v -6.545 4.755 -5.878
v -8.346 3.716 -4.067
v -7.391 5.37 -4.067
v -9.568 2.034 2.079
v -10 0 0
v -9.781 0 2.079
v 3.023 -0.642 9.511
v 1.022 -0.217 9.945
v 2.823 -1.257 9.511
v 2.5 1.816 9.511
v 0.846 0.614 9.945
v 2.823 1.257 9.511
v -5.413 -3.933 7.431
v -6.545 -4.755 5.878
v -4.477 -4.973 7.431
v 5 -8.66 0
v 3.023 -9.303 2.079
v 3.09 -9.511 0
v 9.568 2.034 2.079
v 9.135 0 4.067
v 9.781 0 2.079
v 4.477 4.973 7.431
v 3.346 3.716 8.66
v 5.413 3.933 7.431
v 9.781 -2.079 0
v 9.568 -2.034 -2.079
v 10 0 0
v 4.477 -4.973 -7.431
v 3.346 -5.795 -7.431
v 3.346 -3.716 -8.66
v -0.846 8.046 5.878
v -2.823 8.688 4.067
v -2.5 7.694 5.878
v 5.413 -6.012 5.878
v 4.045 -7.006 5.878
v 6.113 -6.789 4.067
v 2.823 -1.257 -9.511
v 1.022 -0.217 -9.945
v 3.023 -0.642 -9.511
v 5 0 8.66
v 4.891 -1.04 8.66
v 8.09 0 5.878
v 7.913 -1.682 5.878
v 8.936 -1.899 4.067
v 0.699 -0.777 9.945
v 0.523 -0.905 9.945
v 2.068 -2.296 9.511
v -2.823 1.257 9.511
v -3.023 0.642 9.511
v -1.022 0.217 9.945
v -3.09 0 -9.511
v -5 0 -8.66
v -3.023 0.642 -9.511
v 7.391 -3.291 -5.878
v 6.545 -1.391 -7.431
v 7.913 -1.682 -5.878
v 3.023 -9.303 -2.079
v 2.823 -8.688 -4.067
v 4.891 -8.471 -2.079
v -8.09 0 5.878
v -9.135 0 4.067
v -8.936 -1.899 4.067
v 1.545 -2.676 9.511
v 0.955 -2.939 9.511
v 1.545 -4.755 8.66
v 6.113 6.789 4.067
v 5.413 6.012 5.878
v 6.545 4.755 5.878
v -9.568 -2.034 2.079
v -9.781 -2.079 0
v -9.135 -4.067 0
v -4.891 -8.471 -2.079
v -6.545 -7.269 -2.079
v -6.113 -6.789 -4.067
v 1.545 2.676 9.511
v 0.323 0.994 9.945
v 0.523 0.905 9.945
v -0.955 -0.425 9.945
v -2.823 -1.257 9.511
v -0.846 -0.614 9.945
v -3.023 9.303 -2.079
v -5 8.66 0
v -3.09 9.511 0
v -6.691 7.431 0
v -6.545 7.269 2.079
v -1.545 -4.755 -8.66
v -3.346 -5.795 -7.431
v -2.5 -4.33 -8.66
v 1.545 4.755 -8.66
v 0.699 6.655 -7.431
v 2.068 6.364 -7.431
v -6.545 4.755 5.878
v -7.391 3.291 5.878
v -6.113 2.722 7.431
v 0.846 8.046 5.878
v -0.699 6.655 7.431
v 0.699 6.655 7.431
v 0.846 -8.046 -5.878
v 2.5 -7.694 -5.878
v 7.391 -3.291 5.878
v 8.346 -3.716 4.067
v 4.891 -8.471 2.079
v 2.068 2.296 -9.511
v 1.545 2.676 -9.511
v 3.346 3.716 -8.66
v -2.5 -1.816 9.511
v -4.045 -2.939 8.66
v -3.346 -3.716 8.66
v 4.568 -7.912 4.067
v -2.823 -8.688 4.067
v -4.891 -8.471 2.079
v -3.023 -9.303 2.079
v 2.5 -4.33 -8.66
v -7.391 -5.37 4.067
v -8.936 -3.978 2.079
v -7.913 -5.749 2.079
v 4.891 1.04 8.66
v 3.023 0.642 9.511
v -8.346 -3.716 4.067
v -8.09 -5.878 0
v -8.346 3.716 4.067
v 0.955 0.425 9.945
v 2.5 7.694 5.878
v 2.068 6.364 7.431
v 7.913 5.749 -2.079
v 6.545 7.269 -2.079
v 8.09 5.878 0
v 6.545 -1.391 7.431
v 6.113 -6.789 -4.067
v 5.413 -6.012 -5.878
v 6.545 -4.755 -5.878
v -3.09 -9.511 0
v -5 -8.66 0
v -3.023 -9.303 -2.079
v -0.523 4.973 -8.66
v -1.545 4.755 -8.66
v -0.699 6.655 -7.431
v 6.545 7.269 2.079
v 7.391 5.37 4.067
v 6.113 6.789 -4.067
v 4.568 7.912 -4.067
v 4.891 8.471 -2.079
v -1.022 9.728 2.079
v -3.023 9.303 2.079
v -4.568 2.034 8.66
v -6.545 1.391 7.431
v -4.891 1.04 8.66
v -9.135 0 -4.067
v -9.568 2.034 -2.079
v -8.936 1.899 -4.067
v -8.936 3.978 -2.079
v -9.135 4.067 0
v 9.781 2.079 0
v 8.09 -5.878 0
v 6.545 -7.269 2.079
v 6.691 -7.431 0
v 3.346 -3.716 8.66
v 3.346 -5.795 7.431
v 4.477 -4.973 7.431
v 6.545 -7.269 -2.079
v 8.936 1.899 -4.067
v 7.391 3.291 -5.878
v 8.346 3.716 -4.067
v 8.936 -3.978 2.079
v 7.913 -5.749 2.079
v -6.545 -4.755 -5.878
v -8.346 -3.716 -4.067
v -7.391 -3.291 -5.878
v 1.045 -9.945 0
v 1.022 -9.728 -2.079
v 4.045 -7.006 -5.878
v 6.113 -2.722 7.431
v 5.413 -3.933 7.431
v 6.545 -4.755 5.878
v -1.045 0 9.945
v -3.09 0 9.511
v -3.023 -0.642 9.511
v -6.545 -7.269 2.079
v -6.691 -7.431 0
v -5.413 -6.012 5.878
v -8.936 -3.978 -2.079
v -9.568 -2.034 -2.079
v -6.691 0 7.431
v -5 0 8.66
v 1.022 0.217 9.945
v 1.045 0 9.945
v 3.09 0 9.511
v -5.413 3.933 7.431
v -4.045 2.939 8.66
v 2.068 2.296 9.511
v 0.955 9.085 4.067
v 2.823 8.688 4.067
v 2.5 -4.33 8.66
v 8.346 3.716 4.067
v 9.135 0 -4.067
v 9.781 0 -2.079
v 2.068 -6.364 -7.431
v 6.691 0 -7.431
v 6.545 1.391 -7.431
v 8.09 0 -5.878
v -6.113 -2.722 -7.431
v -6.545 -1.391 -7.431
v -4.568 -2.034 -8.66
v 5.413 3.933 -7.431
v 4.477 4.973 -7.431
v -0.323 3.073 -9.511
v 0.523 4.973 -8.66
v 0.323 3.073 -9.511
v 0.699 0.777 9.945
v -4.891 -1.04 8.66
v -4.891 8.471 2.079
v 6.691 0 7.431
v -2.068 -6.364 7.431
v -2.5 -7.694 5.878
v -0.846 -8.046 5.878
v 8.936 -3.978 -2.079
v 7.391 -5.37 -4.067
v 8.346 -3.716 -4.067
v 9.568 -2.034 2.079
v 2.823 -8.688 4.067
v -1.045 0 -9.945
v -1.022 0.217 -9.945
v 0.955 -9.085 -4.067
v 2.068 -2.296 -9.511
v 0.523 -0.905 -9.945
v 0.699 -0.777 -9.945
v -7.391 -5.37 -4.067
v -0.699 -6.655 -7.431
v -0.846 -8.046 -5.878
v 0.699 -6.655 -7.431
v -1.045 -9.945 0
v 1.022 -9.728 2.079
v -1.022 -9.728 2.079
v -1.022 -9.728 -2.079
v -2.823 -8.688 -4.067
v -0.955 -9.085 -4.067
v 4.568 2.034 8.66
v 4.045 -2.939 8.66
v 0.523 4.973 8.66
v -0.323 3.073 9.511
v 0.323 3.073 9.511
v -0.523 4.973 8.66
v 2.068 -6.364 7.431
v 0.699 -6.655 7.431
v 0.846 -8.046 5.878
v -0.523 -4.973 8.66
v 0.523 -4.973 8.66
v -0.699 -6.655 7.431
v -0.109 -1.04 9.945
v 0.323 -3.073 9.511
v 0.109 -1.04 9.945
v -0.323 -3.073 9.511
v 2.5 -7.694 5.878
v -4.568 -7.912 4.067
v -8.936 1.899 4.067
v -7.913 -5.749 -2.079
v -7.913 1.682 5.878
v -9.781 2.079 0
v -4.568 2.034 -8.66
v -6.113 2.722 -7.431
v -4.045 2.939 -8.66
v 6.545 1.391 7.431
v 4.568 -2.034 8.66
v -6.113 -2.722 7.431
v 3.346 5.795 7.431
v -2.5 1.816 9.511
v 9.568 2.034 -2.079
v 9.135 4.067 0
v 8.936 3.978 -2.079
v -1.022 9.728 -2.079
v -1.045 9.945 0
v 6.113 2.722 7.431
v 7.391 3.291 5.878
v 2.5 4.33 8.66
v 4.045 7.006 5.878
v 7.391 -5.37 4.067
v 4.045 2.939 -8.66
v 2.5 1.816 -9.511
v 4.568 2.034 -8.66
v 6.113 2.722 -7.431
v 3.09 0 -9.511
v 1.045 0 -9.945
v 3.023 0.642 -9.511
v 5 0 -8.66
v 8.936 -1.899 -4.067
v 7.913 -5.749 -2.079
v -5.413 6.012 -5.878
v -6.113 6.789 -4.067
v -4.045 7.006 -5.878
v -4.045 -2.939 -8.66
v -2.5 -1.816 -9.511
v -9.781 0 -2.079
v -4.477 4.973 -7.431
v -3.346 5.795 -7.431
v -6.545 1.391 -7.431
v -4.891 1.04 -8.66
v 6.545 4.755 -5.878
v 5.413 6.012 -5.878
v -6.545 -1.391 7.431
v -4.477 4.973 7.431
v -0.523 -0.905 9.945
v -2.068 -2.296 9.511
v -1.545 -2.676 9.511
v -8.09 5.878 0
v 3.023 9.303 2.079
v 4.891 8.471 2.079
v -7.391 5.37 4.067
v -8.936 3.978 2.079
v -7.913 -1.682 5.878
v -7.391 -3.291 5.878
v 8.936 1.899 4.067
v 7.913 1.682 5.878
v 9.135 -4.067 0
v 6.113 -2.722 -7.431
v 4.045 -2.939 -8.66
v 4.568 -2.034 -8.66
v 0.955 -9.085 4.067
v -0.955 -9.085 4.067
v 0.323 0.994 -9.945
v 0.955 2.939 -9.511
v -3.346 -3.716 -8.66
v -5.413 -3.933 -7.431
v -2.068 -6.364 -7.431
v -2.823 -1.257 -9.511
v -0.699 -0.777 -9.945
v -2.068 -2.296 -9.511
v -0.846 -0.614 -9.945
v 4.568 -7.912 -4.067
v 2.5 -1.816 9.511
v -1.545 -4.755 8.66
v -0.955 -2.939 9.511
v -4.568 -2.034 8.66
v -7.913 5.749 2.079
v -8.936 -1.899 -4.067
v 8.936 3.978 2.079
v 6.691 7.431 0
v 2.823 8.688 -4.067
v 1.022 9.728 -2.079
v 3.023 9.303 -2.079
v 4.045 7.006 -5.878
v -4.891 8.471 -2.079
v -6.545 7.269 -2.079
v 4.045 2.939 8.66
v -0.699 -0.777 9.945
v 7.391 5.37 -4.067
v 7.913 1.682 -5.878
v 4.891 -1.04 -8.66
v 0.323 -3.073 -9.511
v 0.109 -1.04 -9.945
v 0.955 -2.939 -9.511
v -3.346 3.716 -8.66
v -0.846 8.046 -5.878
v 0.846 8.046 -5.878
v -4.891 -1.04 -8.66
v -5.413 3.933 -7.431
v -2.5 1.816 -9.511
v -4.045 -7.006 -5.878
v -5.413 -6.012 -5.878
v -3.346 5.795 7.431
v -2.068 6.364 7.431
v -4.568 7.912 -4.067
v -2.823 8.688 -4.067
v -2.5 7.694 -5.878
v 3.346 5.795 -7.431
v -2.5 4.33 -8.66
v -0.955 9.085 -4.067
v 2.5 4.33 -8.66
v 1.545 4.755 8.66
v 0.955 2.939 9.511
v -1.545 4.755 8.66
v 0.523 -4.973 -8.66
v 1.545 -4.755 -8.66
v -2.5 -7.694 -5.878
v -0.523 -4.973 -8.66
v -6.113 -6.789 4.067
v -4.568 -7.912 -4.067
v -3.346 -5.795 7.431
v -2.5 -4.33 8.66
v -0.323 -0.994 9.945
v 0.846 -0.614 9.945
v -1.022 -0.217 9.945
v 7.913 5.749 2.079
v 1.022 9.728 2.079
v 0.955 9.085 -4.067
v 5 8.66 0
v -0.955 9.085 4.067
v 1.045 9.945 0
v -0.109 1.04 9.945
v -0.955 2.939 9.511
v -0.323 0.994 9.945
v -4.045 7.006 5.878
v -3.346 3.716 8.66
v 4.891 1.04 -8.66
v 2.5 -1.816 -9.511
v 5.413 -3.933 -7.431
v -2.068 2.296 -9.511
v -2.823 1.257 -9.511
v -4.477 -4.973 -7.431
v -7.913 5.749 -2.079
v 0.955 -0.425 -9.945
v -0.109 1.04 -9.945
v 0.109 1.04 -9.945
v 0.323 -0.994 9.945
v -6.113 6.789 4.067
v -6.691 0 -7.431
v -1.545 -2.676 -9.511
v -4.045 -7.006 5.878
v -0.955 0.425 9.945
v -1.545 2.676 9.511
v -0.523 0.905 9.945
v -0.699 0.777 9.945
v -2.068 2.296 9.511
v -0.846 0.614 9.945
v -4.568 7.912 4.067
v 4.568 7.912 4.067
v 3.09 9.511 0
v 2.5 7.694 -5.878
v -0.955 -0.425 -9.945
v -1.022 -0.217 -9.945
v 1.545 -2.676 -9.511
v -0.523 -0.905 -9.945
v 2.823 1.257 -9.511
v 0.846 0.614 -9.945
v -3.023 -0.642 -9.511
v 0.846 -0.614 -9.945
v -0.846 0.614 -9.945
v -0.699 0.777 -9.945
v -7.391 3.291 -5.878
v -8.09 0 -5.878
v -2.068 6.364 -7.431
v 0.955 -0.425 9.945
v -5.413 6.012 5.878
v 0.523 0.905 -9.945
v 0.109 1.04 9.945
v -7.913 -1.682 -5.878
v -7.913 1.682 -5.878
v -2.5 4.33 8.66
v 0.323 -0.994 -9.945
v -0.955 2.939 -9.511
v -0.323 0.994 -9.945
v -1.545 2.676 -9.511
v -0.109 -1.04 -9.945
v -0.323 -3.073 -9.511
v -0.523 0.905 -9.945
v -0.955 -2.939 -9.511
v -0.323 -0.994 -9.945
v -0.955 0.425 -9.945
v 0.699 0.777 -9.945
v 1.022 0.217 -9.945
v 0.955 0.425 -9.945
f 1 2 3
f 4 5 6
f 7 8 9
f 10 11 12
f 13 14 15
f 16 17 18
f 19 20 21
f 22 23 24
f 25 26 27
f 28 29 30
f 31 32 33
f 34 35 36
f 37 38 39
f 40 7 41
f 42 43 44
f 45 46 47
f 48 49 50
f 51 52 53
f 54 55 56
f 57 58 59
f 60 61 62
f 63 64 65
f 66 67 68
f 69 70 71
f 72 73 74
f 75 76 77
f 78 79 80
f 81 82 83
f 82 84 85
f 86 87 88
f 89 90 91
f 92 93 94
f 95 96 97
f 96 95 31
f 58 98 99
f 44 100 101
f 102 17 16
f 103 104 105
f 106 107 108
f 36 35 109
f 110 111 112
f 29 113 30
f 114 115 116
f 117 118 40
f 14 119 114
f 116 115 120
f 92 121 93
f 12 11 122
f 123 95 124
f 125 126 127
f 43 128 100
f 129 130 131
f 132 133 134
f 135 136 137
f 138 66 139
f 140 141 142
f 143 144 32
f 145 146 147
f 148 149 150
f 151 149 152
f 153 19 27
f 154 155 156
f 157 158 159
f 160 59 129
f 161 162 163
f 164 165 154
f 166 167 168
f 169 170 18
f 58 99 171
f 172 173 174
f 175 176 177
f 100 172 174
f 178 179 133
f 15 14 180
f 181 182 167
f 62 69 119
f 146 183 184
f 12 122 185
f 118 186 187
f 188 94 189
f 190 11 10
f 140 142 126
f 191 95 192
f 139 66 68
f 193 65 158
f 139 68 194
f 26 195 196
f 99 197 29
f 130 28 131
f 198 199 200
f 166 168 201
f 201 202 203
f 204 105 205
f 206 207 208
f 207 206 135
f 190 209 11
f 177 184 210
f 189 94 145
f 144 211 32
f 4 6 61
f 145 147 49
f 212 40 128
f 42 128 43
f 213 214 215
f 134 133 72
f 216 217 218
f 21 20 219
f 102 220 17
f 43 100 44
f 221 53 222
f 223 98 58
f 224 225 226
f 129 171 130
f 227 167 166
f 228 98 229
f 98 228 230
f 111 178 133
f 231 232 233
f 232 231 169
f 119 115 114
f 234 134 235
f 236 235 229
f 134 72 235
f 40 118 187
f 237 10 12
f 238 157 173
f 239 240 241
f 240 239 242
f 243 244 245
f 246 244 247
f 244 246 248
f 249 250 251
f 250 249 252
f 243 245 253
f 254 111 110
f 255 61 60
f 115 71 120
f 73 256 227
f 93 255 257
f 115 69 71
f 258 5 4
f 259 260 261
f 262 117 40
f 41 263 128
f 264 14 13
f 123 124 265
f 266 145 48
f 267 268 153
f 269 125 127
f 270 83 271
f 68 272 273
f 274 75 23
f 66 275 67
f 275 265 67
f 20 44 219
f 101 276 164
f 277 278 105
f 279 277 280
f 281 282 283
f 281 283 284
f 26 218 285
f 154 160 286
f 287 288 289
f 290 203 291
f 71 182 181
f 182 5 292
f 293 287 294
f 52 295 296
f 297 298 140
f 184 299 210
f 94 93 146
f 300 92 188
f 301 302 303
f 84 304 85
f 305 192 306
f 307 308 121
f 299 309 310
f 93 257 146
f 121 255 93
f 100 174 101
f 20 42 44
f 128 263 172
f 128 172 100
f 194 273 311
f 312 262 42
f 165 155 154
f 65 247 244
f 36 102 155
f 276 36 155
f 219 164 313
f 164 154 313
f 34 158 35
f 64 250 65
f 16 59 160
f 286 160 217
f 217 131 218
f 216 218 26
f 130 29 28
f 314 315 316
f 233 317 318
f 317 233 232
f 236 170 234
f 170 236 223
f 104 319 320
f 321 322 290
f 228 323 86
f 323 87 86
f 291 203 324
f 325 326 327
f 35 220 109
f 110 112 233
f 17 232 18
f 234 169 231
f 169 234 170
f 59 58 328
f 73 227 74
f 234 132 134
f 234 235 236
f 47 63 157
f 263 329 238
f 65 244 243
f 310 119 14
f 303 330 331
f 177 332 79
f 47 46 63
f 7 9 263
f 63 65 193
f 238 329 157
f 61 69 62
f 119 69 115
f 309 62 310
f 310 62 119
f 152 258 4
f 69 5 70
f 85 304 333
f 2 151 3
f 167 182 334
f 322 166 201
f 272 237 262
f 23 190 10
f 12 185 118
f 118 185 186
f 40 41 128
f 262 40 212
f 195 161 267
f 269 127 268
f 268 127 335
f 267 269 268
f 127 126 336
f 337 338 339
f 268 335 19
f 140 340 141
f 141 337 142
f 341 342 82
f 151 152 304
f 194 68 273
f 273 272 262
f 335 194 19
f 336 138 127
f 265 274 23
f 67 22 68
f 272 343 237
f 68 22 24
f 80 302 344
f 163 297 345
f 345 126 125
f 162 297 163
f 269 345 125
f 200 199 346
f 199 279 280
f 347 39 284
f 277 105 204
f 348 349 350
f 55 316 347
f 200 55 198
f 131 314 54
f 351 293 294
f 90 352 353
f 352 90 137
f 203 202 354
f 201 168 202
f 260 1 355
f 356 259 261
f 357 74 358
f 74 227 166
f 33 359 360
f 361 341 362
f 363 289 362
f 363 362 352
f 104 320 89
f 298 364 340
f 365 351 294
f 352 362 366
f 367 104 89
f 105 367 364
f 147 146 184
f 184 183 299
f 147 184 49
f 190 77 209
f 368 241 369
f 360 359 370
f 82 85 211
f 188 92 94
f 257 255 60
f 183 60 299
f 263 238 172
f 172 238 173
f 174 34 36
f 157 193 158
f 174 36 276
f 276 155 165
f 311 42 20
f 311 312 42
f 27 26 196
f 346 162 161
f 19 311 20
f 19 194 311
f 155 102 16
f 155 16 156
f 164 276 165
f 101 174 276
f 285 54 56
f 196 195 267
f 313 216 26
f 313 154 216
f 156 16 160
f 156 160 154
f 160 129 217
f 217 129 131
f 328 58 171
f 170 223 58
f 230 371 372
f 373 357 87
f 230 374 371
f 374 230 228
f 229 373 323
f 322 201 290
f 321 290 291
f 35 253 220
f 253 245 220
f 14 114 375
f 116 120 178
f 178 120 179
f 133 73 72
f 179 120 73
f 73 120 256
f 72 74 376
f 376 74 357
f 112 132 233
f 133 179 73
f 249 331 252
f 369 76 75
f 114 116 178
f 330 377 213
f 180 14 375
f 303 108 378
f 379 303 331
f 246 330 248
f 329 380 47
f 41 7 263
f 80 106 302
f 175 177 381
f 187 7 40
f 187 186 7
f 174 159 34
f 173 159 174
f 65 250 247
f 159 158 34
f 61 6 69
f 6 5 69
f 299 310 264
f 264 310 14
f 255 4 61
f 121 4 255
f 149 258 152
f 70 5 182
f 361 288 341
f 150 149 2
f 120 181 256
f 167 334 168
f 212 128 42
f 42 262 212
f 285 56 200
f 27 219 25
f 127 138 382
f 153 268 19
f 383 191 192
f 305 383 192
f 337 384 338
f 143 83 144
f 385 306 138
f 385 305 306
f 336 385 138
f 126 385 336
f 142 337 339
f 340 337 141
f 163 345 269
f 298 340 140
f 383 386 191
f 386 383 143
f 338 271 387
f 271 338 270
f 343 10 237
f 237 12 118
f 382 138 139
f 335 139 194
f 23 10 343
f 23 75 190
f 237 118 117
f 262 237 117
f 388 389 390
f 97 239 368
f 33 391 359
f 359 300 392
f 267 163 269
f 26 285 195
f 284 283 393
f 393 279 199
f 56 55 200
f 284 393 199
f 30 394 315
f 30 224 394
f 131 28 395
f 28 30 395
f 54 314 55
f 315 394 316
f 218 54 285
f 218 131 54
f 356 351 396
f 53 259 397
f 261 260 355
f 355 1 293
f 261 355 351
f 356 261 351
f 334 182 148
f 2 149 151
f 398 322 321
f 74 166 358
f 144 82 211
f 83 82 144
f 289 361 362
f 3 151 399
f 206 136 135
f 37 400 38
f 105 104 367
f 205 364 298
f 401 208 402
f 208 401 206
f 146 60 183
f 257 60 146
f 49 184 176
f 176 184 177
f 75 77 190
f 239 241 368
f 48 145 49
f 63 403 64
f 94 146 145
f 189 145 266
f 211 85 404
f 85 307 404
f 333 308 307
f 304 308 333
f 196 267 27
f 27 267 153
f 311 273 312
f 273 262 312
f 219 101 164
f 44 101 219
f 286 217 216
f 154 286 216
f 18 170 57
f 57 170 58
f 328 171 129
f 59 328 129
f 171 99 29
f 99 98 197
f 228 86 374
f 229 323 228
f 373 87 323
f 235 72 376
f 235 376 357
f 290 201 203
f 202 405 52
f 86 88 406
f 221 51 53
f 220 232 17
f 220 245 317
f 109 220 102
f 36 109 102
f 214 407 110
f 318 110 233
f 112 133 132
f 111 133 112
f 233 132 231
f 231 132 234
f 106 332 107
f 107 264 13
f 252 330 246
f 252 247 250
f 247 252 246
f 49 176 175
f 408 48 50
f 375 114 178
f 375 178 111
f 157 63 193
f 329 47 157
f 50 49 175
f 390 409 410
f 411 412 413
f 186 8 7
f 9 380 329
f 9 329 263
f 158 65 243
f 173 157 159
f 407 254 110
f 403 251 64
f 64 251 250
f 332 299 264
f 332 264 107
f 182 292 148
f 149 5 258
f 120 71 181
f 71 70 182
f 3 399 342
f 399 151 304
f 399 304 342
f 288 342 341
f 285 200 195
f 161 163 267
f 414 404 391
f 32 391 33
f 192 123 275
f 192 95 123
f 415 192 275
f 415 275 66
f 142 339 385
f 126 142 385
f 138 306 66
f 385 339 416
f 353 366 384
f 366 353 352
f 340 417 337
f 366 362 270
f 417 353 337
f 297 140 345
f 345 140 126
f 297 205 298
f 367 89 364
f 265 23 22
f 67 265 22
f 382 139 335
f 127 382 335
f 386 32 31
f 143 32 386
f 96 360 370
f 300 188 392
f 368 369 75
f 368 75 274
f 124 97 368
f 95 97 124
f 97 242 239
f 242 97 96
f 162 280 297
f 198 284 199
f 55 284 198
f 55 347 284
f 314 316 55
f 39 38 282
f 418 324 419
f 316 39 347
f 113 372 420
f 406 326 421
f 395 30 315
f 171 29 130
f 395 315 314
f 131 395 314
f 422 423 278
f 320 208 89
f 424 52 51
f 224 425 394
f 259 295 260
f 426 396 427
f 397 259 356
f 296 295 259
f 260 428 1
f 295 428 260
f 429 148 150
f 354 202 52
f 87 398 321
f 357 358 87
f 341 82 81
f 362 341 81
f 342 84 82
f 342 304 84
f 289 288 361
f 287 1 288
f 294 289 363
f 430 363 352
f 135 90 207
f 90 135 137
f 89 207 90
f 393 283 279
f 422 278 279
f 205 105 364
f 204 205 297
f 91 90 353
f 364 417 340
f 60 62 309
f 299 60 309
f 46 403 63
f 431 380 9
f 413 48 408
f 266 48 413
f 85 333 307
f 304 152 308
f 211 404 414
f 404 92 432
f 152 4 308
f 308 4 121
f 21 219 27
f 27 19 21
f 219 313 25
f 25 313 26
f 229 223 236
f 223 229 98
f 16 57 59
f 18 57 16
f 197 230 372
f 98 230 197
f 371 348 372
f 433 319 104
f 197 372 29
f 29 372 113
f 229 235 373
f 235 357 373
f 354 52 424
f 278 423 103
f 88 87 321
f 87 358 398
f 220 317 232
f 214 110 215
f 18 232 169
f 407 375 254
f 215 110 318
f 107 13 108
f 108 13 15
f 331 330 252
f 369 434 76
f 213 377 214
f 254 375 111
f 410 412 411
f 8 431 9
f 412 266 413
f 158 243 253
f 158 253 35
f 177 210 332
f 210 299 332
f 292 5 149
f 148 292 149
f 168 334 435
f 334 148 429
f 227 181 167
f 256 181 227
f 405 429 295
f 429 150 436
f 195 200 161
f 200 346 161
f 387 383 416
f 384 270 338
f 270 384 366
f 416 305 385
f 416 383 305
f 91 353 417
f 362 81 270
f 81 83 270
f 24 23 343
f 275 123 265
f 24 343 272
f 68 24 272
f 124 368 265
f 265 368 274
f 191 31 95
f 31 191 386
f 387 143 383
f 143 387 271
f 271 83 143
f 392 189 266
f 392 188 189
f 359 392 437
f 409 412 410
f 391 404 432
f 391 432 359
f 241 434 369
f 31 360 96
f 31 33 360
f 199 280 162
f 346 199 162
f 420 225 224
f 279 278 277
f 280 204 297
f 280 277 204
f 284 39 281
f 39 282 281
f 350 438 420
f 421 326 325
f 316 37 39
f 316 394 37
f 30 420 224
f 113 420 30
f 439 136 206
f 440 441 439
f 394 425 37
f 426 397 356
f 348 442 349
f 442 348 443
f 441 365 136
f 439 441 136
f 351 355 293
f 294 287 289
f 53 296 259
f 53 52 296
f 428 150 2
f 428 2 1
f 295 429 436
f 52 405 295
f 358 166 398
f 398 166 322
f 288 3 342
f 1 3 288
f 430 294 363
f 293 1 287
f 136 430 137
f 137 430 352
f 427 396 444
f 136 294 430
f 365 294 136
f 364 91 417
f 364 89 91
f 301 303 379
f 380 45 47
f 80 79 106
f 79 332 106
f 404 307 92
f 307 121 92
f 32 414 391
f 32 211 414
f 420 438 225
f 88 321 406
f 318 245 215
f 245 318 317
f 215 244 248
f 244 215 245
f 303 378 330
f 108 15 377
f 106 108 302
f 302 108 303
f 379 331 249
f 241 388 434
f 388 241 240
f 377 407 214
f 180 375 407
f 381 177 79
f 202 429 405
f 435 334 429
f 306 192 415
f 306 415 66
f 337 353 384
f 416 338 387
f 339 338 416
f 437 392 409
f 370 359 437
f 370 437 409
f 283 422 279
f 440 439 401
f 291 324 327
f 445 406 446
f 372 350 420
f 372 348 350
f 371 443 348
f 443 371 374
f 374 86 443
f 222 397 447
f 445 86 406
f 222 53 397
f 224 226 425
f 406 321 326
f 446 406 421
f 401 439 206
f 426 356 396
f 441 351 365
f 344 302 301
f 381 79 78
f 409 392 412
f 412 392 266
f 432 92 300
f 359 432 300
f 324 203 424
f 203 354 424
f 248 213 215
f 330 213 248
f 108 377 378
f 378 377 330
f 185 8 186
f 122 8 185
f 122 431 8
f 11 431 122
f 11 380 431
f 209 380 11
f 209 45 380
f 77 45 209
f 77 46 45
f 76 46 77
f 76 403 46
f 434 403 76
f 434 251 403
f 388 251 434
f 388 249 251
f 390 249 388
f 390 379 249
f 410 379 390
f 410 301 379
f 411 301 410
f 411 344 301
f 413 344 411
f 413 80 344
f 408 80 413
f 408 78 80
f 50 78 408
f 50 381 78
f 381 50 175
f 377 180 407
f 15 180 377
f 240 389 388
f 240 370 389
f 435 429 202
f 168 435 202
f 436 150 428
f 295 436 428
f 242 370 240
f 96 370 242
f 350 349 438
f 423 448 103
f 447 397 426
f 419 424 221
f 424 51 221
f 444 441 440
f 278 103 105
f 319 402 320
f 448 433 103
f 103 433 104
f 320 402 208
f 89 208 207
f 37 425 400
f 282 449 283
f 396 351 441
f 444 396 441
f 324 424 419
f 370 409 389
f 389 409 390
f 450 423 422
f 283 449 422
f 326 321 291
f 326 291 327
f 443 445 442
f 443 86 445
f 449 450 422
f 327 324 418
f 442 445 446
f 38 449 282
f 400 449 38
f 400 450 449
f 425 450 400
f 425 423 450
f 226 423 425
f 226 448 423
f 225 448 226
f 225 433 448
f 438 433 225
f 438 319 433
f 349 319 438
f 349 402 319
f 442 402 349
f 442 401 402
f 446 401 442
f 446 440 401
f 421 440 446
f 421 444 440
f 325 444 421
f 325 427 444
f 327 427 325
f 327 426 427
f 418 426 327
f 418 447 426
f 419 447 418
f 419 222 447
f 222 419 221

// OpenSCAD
// Generated by generate_scads.py
union() {
  union() {
    sphere(r=4);
  }
  intersection() {
    sphere(r=10);
    sphere(r=10);
  }
  union() {
    cube(size=[15,5,10], center=true);
  }
}
